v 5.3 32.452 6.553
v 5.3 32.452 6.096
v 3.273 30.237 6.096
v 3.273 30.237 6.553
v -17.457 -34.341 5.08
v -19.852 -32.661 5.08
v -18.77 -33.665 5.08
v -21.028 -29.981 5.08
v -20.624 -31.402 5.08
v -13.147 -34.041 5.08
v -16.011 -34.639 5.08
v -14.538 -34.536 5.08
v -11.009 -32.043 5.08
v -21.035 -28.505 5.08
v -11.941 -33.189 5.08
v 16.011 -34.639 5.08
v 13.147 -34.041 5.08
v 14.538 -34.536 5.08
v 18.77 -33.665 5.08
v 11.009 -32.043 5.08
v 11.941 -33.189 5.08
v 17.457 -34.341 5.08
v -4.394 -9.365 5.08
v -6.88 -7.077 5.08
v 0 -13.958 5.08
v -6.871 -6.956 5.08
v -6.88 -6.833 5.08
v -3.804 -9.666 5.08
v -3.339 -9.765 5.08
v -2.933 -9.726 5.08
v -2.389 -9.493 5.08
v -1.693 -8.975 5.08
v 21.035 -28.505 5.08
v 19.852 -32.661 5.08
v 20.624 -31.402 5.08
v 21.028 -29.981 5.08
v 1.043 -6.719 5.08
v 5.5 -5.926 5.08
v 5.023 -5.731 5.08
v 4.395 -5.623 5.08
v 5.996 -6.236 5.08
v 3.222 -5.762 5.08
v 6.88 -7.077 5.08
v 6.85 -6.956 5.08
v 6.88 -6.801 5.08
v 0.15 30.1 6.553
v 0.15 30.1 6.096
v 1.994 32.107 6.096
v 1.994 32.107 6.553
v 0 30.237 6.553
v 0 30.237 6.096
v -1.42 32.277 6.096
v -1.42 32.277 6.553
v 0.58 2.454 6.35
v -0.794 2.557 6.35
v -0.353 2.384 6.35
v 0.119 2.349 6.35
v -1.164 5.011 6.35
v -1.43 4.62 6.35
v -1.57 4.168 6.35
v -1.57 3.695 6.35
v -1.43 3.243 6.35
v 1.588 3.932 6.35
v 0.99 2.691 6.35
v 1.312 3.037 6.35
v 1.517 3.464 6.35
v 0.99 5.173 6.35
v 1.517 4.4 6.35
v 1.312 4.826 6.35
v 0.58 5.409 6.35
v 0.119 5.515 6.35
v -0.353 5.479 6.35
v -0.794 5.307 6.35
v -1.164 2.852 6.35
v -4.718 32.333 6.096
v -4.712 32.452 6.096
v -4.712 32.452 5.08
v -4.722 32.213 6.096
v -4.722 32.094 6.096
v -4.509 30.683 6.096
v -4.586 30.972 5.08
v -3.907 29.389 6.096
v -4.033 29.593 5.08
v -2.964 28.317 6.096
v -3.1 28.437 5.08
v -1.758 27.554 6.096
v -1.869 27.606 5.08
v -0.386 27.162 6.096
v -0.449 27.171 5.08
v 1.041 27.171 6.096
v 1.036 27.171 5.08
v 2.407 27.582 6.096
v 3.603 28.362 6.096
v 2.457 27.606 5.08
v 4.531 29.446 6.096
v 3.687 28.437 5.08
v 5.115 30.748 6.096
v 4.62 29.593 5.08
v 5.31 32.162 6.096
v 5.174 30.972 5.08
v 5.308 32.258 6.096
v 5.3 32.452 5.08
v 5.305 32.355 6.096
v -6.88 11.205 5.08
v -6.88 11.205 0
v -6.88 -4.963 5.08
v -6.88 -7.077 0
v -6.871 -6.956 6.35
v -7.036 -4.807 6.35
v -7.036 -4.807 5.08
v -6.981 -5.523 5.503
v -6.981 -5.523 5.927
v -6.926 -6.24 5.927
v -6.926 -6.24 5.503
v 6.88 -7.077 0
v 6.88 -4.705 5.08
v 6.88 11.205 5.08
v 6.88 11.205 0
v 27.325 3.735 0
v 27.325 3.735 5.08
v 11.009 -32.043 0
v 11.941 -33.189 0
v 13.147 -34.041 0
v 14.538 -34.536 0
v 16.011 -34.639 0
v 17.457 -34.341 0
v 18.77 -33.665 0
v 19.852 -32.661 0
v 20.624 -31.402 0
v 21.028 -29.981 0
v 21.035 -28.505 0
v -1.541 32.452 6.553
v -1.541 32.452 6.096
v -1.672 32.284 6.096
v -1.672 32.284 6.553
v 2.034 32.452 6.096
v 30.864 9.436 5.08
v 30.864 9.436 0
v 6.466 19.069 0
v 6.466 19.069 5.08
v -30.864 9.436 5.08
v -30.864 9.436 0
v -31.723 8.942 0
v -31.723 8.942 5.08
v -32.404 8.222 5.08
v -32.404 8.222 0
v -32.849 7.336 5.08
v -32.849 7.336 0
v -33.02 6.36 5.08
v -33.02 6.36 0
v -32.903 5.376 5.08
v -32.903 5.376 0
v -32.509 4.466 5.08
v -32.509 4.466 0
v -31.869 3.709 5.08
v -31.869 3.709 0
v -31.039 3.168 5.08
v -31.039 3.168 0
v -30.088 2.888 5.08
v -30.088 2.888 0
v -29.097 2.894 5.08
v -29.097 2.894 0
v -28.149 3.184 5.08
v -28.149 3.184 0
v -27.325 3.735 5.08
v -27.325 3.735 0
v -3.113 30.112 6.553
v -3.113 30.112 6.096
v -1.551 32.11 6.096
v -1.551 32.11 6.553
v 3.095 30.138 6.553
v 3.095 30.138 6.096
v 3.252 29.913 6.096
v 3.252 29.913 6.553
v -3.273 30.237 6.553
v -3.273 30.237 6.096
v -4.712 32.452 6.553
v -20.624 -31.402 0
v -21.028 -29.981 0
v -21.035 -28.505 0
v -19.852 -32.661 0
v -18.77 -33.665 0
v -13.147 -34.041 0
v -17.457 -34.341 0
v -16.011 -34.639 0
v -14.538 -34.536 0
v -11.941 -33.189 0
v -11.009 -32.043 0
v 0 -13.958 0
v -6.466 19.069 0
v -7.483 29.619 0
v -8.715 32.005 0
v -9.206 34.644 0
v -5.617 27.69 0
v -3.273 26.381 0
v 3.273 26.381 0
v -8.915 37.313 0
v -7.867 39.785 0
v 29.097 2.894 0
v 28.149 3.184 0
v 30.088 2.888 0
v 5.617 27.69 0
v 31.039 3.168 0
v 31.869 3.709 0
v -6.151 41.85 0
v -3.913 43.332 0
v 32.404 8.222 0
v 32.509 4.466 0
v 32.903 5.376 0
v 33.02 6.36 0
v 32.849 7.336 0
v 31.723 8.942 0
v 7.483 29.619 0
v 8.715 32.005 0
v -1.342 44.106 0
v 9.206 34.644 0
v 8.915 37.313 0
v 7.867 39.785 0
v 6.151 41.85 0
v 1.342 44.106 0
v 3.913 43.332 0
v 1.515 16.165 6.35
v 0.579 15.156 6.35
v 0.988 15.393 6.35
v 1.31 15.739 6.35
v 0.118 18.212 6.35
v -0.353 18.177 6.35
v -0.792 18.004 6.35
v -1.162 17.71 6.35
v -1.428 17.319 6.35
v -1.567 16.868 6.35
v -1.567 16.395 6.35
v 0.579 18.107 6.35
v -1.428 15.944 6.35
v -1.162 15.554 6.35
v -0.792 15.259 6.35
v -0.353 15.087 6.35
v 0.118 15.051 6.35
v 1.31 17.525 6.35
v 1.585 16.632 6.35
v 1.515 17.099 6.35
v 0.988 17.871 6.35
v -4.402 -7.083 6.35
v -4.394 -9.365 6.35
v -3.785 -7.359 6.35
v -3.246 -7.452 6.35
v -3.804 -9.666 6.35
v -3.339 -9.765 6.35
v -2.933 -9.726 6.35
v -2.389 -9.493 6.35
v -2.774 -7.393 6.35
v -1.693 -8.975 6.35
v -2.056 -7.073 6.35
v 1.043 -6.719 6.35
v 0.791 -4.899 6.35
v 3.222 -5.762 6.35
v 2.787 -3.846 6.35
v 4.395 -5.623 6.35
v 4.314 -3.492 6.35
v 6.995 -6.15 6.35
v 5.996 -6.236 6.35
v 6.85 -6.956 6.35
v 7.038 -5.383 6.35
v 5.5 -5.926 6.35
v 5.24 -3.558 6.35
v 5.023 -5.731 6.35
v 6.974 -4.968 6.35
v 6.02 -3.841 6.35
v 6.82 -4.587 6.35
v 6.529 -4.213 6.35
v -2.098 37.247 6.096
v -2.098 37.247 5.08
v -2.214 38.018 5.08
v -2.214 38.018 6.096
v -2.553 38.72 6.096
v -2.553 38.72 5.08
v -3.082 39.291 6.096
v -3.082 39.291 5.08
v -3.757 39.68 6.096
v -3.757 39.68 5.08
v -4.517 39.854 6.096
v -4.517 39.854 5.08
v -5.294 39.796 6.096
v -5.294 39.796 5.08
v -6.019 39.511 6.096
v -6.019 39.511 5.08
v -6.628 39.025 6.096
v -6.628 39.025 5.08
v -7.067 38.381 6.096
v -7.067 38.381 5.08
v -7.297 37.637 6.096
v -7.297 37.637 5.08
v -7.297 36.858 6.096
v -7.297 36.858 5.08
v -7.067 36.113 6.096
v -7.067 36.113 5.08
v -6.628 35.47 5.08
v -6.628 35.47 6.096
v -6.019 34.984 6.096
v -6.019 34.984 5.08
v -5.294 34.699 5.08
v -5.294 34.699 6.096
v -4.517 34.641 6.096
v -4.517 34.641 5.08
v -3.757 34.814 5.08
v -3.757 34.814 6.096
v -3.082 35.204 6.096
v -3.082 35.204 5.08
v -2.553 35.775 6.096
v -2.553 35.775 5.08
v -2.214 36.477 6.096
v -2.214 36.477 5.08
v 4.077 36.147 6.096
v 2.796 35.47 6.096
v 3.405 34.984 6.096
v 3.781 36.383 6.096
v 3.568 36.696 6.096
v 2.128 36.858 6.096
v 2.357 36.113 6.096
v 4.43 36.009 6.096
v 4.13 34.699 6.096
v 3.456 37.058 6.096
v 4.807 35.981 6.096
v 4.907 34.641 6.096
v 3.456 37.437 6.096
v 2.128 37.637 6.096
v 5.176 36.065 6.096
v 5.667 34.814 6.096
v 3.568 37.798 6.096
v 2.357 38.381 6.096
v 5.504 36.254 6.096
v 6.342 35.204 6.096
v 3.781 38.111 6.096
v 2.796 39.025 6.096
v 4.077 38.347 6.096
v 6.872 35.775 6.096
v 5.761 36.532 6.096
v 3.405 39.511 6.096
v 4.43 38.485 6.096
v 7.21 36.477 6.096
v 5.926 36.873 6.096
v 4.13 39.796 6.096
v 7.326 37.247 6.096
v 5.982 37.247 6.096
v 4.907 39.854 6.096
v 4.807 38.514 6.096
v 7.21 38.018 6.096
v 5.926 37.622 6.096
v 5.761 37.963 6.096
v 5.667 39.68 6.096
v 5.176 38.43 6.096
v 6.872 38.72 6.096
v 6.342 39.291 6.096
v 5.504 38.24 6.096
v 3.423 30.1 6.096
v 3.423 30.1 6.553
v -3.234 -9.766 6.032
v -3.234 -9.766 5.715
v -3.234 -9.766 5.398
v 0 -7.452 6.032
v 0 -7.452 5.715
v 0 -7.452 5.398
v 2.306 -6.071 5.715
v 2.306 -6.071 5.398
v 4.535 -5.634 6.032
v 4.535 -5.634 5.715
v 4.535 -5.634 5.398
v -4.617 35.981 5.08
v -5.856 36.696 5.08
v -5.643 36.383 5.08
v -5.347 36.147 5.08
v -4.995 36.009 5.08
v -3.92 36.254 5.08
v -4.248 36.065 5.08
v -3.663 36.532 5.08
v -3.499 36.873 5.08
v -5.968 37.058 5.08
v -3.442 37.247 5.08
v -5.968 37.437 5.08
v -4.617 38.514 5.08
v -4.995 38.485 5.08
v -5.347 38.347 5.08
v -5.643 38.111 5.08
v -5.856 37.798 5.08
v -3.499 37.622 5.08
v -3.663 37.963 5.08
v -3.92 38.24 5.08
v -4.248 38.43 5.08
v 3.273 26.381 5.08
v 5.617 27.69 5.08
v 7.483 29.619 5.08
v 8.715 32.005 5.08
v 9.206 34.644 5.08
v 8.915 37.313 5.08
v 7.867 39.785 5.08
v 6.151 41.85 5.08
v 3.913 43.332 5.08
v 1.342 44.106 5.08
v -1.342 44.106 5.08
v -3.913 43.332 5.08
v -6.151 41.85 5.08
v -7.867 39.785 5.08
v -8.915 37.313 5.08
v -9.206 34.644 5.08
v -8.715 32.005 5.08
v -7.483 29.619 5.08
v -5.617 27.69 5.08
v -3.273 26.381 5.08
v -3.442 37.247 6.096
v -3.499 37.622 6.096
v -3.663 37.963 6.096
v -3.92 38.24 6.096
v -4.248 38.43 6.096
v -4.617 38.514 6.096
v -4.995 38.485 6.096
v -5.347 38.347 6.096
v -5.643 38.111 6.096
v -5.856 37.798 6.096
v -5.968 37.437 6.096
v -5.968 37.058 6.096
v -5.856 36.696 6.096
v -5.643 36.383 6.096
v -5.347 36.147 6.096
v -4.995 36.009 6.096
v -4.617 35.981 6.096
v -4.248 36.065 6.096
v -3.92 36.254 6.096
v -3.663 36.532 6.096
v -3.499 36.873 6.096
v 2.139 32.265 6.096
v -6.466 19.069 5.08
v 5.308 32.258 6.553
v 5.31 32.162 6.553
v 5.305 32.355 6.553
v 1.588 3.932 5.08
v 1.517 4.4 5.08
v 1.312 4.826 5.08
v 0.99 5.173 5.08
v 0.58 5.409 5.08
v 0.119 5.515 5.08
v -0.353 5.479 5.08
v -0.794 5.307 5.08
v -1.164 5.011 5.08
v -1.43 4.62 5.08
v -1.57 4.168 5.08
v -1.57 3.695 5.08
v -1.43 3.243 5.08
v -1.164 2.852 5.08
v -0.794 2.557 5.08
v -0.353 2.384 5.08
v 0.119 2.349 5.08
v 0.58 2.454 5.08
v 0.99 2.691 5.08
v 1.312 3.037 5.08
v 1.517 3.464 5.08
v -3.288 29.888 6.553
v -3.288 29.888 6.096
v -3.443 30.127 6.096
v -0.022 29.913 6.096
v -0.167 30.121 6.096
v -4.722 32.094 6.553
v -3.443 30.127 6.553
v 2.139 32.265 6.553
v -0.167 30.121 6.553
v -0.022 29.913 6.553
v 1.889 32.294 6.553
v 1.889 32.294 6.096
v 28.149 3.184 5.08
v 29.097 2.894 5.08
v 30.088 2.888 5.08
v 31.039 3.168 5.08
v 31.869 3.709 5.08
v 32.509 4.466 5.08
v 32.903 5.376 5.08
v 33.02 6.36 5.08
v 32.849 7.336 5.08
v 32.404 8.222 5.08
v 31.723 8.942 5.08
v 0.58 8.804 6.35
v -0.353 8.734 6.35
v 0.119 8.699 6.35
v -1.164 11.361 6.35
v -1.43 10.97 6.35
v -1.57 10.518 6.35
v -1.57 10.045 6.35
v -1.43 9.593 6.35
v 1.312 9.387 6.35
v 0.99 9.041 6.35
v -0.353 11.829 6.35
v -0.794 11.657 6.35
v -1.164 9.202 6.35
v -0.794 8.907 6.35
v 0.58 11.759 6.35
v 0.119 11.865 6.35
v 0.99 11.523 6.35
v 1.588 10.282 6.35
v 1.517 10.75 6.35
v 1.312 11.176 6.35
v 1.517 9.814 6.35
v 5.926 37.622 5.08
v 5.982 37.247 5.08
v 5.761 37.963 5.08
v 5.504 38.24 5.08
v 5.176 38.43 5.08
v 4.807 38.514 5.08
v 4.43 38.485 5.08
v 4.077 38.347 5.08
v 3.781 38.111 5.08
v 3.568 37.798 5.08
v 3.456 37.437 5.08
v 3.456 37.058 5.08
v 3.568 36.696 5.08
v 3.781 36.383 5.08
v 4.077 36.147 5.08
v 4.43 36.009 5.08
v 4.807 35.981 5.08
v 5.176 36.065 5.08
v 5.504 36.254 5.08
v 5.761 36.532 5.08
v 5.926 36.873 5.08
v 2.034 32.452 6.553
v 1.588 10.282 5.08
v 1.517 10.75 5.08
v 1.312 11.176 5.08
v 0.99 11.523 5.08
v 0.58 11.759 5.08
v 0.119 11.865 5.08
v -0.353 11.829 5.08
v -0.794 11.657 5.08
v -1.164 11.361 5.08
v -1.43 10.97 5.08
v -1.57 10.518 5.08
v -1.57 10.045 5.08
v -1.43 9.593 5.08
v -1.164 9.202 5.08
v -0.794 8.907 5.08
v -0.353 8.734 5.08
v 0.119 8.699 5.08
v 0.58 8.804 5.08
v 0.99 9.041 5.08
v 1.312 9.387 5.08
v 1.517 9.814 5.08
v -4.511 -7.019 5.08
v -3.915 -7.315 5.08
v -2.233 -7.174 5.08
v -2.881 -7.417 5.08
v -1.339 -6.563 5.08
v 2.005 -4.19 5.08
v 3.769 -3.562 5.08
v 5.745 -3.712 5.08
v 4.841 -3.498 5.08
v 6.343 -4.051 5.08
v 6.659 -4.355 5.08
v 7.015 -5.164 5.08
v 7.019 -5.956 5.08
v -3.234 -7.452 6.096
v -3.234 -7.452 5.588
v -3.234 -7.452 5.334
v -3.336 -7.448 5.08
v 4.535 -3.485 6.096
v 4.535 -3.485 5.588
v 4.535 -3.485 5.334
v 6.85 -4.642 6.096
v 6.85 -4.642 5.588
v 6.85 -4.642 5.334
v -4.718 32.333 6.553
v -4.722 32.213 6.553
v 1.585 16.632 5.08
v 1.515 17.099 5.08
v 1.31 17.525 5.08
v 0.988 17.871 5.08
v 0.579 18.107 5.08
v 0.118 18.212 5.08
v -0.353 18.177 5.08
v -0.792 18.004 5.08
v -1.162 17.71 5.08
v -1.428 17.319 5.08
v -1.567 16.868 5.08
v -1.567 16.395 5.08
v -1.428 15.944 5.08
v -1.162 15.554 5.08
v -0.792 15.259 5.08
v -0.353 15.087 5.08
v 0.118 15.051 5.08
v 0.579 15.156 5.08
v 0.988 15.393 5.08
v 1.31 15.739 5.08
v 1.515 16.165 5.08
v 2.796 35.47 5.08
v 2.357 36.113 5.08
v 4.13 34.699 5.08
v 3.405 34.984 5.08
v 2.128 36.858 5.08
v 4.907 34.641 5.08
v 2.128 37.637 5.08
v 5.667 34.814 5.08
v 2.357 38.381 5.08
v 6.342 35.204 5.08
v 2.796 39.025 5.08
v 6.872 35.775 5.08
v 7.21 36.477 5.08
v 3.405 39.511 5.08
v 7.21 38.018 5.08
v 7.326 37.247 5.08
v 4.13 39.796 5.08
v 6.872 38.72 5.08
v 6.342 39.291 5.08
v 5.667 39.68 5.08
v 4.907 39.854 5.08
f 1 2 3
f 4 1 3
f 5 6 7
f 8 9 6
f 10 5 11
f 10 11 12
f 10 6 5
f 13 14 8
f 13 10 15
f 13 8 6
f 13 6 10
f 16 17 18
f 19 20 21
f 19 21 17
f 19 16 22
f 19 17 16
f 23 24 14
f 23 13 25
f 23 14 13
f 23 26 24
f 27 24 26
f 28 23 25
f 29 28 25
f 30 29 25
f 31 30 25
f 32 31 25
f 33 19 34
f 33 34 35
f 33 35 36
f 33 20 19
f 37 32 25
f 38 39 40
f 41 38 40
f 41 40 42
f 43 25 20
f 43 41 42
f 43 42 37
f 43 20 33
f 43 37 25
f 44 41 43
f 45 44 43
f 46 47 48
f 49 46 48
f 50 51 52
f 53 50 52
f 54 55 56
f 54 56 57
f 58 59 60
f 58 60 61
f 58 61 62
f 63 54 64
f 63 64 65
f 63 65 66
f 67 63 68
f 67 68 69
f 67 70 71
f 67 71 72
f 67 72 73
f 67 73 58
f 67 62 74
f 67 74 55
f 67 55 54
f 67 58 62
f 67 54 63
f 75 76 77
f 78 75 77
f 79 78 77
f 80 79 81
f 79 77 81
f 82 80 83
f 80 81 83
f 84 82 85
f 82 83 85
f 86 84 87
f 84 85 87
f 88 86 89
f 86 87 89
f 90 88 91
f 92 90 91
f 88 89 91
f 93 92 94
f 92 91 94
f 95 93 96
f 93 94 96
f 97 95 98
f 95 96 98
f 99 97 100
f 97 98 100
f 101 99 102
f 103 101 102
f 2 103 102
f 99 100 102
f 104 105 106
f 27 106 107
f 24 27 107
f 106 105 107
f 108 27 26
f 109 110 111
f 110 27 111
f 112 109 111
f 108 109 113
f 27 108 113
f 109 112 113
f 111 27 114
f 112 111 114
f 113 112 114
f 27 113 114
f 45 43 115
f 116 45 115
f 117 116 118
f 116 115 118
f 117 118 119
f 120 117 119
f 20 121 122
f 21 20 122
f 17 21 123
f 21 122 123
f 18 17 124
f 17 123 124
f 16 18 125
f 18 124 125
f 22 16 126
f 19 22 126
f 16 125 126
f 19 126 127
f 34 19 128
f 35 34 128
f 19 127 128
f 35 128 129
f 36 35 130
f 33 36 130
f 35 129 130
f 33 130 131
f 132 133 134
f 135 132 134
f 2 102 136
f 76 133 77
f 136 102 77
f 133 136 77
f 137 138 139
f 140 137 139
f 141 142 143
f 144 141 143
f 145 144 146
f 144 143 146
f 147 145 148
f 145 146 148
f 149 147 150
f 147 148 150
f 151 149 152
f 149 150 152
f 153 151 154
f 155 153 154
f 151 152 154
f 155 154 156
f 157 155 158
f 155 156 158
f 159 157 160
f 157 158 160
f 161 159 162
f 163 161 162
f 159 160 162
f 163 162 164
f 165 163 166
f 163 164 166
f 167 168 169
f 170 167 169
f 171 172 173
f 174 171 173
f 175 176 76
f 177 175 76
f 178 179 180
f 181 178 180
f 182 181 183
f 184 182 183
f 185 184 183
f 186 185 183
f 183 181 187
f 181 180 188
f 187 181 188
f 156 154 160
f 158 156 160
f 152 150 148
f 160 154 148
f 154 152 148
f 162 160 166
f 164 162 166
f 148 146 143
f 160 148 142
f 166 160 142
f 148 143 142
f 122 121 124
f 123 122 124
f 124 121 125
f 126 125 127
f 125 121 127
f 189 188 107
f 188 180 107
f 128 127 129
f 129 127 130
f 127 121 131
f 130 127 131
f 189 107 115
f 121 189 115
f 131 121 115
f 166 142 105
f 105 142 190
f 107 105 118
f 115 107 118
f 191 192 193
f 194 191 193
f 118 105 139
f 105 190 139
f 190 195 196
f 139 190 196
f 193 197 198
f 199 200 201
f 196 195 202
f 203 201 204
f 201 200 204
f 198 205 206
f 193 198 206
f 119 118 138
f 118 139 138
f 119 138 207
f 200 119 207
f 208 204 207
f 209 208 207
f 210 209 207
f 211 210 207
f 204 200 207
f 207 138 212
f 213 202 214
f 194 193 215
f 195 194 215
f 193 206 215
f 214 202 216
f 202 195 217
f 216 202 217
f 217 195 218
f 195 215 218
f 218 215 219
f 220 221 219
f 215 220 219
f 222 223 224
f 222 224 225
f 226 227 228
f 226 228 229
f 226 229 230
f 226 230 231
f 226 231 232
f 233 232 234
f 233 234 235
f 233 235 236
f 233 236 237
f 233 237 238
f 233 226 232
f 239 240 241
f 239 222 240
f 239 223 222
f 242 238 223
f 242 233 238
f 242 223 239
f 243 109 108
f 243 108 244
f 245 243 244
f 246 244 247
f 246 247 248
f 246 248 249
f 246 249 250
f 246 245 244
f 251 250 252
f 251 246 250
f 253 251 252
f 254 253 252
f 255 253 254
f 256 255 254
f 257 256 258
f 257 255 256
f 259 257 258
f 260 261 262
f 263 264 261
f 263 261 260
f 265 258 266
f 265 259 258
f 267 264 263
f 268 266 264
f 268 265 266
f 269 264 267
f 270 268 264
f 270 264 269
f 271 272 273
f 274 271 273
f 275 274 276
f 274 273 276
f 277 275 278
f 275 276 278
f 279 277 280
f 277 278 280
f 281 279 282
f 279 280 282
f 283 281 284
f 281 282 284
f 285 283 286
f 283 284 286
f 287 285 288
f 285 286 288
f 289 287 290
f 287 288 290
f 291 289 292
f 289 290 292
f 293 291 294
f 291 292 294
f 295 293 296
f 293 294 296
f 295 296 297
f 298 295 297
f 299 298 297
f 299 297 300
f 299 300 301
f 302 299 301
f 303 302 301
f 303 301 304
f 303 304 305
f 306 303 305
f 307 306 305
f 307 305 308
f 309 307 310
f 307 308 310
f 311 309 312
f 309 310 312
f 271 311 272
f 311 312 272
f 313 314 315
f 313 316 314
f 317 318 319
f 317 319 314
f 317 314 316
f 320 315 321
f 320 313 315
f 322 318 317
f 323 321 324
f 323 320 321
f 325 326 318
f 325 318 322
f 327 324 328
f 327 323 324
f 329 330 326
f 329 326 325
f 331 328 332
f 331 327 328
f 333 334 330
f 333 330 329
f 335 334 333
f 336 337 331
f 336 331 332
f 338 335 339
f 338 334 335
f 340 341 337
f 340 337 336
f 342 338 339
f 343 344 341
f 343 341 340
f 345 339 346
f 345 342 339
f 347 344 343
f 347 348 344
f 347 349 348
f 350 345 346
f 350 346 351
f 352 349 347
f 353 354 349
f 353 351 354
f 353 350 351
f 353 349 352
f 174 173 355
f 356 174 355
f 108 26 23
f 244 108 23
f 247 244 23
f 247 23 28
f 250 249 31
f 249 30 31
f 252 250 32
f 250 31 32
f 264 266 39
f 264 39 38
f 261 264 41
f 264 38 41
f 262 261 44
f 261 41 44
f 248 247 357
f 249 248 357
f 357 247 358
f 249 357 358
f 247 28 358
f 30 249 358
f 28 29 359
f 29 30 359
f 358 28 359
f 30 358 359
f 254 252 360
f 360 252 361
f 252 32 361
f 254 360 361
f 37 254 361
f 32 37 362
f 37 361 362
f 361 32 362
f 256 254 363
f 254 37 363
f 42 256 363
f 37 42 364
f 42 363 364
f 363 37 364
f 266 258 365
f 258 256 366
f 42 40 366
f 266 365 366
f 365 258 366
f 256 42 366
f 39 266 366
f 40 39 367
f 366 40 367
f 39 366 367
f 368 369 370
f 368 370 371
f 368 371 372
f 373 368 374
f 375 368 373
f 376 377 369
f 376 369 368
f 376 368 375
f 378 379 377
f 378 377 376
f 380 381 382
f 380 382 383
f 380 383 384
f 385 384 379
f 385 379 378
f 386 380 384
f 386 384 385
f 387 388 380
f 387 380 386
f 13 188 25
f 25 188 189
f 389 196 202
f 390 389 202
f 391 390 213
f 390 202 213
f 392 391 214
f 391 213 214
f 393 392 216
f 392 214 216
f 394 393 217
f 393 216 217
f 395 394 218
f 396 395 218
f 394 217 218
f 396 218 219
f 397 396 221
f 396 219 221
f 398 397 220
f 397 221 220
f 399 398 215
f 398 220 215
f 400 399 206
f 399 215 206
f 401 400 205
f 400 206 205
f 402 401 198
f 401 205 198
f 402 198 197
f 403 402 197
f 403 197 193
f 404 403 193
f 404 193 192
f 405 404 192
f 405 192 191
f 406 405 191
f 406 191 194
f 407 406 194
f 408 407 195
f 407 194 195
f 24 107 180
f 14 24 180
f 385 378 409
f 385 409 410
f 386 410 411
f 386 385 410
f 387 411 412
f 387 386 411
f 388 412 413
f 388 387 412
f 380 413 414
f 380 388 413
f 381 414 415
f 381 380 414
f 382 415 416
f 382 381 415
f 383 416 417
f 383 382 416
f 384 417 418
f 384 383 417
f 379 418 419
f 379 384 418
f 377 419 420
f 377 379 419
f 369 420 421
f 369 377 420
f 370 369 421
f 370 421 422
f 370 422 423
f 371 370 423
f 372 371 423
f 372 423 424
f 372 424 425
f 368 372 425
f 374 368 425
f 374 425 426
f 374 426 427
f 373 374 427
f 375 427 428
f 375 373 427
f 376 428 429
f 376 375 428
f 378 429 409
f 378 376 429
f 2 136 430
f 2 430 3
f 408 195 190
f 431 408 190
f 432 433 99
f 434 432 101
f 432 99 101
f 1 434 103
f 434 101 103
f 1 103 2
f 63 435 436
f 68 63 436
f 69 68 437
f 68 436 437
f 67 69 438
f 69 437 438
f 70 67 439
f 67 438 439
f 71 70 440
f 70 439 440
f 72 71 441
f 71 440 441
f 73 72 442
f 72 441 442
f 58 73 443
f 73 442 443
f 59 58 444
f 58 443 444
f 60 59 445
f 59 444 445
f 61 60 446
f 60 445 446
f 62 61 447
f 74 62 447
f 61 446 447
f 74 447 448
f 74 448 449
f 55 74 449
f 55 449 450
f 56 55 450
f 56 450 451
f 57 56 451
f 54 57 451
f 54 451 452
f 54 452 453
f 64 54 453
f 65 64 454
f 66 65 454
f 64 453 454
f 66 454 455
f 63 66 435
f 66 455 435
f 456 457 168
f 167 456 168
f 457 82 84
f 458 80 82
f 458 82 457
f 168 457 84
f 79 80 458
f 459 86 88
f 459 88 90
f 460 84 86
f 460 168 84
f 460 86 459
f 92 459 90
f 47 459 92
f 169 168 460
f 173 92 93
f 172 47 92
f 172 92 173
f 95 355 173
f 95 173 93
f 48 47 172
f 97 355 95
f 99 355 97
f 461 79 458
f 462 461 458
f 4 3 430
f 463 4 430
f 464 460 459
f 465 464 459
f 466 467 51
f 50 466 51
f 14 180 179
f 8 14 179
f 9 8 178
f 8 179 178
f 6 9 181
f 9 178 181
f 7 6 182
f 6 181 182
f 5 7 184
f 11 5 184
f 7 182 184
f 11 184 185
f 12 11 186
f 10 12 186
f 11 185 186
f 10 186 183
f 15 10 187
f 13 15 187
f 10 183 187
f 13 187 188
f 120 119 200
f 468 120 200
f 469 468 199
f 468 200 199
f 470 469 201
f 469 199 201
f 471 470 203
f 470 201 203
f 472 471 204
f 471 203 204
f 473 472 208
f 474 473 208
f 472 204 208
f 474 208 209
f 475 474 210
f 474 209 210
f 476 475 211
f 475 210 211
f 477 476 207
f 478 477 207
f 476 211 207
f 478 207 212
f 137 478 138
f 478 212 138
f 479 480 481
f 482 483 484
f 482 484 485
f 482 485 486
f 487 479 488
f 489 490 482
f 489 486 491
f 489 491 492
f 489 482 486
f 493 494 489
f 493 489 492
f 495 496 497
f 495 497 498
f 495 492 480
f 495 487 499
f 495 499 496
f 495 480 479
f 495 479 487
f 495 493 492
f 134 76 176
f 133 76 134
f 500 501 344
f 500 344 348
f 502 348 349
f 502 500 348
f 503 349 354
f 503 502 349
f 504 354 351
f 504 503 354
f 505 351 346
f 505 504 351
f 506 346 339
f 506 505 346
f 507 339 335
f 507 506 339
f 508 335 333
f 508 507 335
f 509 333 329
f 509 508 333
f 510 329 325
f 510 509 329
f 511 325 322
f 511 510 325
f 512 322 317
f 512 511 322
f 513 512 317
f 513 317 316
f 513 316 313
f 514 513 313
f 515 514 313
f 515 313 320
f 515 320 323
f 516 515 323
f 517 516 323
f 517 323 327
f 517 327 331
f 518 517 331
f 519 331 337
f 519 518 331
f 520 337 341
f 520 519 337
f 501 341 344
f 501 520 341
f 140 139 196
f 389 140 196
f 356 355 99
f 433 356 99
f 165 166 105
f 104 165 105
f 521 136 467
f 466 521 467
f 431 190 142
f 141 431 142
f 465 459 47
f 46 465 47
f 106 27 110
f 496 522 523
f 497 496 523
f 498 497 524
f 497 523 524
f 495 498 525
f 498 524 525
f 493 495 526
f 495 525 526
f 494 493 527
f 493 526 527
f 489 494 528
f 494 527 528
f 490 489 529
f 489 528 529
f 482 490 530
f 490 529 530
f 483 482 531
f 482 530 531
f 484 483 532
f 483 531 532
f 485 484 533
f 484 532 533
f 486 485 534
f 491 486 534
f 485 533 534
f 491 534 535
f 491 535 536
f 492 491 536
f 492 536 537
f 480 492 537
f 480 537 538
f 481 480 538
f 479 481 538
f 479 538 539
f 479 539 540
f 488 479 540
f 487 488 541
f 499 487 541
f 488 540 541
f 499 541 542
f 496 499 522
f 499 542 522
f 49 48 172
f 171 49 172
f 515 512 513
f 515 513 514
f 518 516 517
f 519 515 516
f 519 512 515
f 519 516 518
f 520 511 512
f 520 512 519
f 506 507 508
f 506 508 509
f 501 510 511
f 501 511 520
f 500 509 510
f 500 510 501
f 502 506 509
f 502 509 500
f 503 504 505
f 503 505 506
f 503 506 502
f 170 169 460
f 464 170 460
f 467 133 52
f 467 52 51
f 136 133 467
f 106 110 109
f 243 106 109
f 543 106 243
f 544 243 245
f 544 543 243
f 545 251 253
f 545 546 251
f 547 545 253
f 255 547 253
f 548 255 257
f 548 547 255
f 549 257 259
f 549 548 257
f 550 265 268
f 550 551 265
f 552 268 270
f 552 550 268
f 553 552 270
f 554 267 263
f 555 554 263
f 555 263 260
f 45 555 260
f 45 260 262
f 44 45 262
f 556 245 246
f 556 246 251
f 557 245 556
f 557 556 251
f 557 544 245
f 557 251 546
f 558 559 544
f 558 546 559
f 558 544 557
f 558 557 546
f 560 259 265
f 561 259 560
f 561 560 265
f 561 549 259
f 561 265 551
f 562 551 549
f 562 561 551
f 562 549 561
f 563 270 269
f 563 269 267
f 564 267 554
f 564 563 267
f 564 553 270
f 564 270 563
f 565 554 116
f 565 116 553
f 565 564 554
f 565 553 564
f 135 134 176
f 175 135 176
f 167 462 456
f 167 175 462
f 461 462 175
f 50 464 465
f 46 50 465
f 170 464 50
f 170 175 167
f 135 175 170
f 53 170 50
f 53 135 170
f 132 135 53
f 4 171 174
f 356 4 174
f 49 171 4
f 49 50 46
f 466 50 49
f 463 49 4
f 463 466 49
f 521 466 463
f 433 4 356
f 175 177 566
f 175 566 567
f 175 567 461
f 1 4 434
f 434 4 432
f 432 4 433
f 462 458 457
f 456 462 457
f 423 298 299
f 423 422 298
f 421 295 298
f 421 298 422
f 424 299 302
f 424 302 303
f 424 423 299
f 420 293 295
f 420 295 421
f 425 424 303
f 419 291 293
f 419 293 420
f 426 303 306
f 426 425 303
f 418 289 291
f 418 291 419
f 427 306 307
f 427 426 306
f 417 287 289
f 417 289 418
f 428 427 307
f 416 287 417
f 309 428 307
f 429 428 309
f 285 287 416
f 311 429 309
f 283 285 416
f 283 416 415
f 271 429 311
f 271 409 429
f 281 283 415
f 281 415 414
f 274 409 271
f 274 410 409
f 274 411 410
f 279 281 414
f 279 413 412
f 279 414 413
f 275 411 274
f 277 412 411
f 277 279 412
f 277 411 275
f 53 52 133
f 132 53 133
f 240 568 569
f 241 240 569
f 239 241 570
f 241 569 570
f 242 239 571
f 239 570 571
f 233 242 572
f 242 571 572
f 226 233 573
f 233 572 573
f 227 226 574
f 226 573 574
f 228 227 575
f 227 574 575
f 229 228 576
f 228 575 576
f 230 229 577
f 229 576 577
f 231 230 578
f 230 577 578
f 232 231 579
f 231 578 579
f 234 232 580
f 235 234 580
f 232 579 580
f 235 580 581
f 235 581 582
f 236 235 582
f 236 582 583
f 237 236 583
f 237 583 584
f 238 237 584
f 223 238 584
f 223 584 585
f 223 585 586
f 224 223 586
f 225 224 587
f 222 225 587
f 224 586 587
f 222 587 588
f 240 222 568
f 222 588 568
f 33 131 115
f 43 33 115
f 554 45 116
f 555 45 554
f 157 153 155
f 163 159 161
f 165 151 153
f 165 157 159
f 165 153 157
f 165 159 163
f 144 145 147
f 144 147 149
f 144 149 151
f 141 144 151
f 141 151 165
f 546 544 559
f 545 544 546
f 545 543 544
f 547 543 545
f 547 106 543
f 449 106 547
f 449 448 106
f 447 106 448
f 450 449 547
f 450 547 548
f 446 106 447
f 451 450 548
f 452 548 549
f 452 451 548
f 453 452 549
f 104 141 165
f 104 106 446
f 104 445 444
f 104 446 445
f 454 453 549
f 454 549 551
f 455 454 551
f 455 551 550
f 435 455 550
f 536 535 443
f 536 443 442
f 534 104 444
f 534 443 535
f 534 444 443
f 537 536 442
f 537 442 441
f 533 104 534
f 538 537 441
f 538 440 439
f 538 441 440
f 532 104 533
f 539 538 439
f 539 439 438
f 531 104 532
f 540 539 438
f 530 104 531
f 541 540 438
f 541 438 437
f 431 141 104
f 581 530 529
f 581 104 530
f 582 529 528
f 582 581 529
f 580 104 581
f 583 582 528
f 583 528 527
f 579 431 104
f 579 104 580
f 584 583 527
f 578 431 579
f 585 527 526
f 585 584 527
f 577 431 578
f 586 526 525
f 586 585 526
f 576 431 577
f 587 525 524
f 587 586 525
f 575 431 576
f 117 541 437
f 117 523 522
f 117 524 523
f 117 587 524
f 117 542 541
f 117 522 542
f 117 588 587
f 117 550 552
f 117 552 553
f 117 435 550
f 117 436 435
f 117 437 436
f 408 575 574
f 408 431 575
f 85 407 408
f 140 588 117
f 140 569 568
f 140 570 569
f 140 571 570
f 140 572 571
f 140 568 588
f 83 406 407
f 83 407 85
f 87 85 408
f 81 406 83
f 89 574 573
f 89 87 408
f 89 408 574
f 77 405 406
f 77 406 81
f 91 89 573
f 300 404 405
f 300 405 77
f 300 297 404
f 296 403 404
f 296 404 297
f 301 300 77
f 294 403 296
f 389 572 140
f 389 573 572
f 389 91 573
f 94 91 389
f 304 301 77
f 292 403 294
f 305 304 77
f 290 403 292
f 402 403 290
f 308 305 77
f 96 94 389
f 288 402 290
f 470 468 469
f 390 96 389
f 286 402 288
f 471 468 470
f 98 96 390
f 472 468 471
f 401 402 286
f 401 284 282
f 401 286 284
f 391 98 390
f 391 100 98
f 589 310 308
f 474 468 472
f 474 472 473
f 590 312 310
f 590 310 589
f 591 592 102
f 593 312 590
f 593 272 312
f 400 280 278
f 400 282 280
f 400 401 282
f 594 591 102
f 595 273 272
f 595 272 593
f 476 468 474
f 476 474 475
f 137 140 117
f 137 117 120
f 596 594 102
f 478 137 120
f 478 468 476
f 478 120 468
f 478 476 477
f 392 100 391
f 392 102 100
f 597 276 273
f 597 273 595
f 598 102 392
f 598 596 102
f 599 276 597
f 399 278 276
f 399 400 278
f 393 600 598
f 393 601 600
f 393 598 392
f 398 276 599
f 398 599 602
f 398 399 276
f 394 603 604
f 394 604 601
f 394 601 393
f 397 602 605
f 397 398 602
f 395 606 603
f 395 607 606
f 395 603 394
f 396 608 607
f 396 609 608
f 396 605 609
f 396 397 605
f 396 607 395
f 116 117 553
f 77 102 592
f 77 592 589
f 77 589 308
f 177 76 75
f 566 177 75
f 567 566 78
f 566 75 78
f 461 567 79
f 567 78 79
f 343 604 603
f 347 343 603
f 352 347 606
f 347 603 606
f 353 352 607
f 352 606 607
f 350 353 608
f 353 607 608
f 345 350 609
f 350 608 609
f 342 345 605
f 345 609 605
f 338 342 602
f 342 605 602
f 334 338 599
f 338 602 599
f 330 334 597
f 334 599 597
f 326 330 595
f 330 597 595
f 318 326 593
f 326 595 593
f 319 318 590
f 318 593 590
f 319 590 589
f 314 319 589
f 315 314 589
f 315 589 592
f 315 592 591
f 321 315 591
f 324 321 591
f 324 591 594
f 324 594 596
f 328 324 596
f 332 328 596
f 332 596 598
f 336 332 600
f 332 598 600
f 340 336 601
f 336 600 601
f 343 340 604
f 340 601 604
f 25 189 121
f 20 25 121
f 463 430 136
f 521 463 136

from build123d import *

# Parameters (mm, degrees)
F1_DEPTH = 5.08
F2_R     = 2.6137383635
F2_R_2   = 1.27
F3_DEPTH = 1.016
F5_DEPTH = 0.4572
F6_R     = 1.5849178859
F6_R_2   = 1.5875
F7_DEPTH = 1.27
F9_DEPTH = 1.27


with BuildPart() as f1:
    # F0 (on Top) → F1 (new body)
    with BuildSketch(Plane.XY):
        with BuildLine():
            Line((-3.2727682094, 26.3807782884), (-6.4659603156, 19.0687214415))
            Line((-6.4659603156, 19.0687214415), (-30.863808468, 9.4360690564))
            ThreePointArc((-30.863808468, 9.4360690564), (-32.5086762666, 4.4664752799), (-27.325283736, 3.7351106293))
            Line((-27.325283736, 3.7351106293), (-6.8804663606, 11.2053323537))
            Line((-6.8804663606, 11.2053323537), (-6.8804663606, -7.0770513266))
            Line((-6.8804663606, -7.0770513266), (-21.0345704108, -28.5047926009))
            ThreePointArc((-21.0345704108, -28.5047926009), (-17.4572264743, -34.3414996844), (-11.008746922, -32.0433154702))
            Line((-11.008746922, -32.0433154702), (0, -13.9575190842))
            Line((0, -13.9575190842), (11.008746922, -32.0433154702))
            ThreePointArc((11.008746922, -32.0433154702), (17.4572264743, -34.3414996844), (21.0345704108, -28.5047926009))
            Line((21.0345704108, -28.5047926009), (6.8804663606, -7.0770513266))
            Line((6.8804663606, -7.0770513266), (6.8804663606, 11.2053323537))
            Line((6.8804663606, 11.2053323537), (27.325283736, 3.7351106293))
            ThreePointArc((27.325283736, 3.7351106293), (32.5086762666, 4.4664752799), (30.863808468, 9.4360690564))
            Line((30.863808468, 9.4360690564), (6.4659603156, 19.0687214415))
            Line((6.4659603156, 19.0687214415), (3.2727682094, 26.3807782884))
            ThreePointArc((3.2727682094, 26.3807782884), (0, 44.2043436195), (-3.2727682094, 26.3807782884))
        make_face()
    extrude(amount=F1_DEPTH)

    # F2 (on face) → F3 (join)
    with BuildSketch(Plane.XY.offset(5.08)):
        with Locations((-4.7121047974, 37.2473150492)):
            Circle(F2_R)
        with Locations((-4.7121047974, 37.2473150492)):
            Circle(F2_R_2, mode=Mode.SUBTRACT)
        with Locations((4.7121047974, 37.2473150492)):
            Circle(F2_R)
        with Locations((4.7121047974, 37.2473150492)):
            Circle(F2_R_2, mode=Mode.SUBTRACT)
        with BuildLine():
            Line((-3.2727682094, 30.2372745808), (-4.7121047974, 32.4515290558))
            ThreePointArc((-4.7121047974, 32.4515290558), (0.2937612268, 27.1153177061), (5.2996272509, 32.4515290558))
            Line((5.2996272509, 32.4515290558), (3.2727682094, 30.2372745808))
            Line((3.2727682094, 30.2372745808), (2.0341726185, 32.4515290558))
            Line((2.0341726185, 32.4515290558), (0, 30.2372745808))
            Line((0, 30.2372745808), (-1.5411652881, 32.4515290558))
            Line((-1.5411652881, 32.4515290558), (-3.2727682094, 30.2372745808))
        make_face()
        Polygon((-1.5411652881, 32.4515290558), (-4.7121047974, 32.4515290558), (-3.2727682094, 30.2372745808), align=None)
        Polygon((3.2727682094, 30.2372745808), (5.2996272509, 32.4515290558), (2.0341726185, 32.4515290558), align=None)
        Polygon((2.0341726185, 32.4515290558), (-1.5411652881, 32.4515290558), (0, 30.2372745808), align=None)
    extrude(amount=F3_DEPTH)

    # F4 (on face) → F5 (join)
    with BuildSketch(Plane.XY.offset(6.096)):
        with BuildLine():
            Line((-3.2727682094, 30.2372745808), (-4.7121047974, 32.4515290558))
            ThreePointArc((-4.7121047974, 32.4515290558), (-4.7203324358, 32.2729584869), (-4.7221920847, 32.0942081475))
            Line((-4.7221920847, 32.0942081475), (-3.4431374496, 30.126529098))
            Line((-3.4431374496, 30.126529098), (-3.2880254188, 29.8879070055))
            Line((-3.2880254188, 29.8879070055), (-3.1127018776, 30.1120986668))
            Line((-3.1127018776, 30.1120986668), (-1.5506819831, 32.1095020547))
            Line((-1.5506819831, 32.1095020547), (-0.1667791776, 30.121192946))
            Line((-0.1667791776, 30.121192946), (-0.0219153894, 29.9130612851))
            Line((-0.0219153894, 29.9130612851), (0.1496401921, 30.0998043917))
            Line((0.1496401921, 30.0998043917), (1.9938853204, 32.1073174174))
            Line((1.9938853204, 32.1073174174), (3.0954276532, 30.138074948))
            Line((3.0954276532, 30.138074948), (3.2517947624, 29.9134160007))
            Line((3.2517947624, 29.9134160007), (3.4226548069, 30.1000730943))
            Line((3.4226548069, 30.1000730943), (5.3097613024, 32.1616540513))
            ThreePointArc((5.3097613024, 32.1616540513), (5.306789943, 32.3066648182), (5.2996272509, 32.4515290558))
            Line((5.2996272509, 32.4515290558), (3.2727682094, 30.2372745808))
            Line((3.2727682094, 30.2372745808), (2.13859977, 32.2648431922))
            Line((2.13859977, 32.2648431922), (2.0341726185, 32.4515290558))
            Line((2.0341726185, 32.4515290558), (1.8894581688, 32.2940032811))
            Line((1.8894581688, 32.2940032811), (0, 30.2372745808))
            Line((0, 30.2372745808), (-1.4196918326, 32.2770032315))
            Line((-1.4196918326, 32.2770032315), (-1.5411652881, 32.4515290558))
            Line((-1.5411652881, 32.4515290558), (-1.6721554386, 32.2840278791))
            Line((-1.6721554386, 32.2840278791), (-3.2727682094, 30.2372745808))
        make_face()
    extrude(amount=F5_DEPTH)

    # F6 (on face) → F7 (join)
    with BuildSketch(Plane.XY.offset(5.08)):
        with Locations((0, 16.6316951297)):
            Circle(F6_R)
        with Locations((0, 10.2816951297)):
            Circle(F6_R_2)
        with Locations((0, 3.9316951297)):
            Circle(F6_R_2)
    extrude(amount=F7_DEPTH)

    # F8 (on face) → F9 (join)
    with BuildSketch(Plane.XY.offset(5.08)):
        with BuildLine():
            add(Edge.make_bspline(
                [(-7.0363054983, -4.8071318306), (-6.9812030221, -5.5234641768), (-6.9261005459, -6.239796523), (-6.8709980696, -6.9561288692)],
                knots=[0, 0, 0, 0, 2.1553456377, 2.1553456377, 2.1553456377, 2.1553456377], degree=3))
            add(Edge.make_bspline(
                [(-6.8709980696, -6.9561288692), (-5.6130342711, -8.3738225884), (-3.1848892901, -11.1102812153), (-0.243495057, -7.0612015798), (4.5821148023, -4.8991787577), (6.1734744422, -6.3428325856), (6.8495194428, -6.9561288692)],
                knots=[0, 0, 0, 0, 0.2686113424, 0.5184785791, 0.7954389812, 1, 1, 1, 1], degree=3))
            add(Edge.make_bspline(
                [(-7.0363054983, -4.8071318306), (-5.7248109737, -6.1236047459), (-3.2262965612, -8.6316034379), (-0.1133011688, -5.1968632917), (4.3194928458, -2.8270018136), (7.3601699927, -4.4068743135), (7.0165421861, -6.1223228754), (6.8495194428, -6.9561288692)],
                knots=[0, 0, 0, 0, 0.2276234559, 0.4336430496, 0.668963168, 0.8390971896, 1, 1, 1, 1], degree=3))
        make_face()
    extrude(amount=F9_DEPTH)


solid = f1.part
